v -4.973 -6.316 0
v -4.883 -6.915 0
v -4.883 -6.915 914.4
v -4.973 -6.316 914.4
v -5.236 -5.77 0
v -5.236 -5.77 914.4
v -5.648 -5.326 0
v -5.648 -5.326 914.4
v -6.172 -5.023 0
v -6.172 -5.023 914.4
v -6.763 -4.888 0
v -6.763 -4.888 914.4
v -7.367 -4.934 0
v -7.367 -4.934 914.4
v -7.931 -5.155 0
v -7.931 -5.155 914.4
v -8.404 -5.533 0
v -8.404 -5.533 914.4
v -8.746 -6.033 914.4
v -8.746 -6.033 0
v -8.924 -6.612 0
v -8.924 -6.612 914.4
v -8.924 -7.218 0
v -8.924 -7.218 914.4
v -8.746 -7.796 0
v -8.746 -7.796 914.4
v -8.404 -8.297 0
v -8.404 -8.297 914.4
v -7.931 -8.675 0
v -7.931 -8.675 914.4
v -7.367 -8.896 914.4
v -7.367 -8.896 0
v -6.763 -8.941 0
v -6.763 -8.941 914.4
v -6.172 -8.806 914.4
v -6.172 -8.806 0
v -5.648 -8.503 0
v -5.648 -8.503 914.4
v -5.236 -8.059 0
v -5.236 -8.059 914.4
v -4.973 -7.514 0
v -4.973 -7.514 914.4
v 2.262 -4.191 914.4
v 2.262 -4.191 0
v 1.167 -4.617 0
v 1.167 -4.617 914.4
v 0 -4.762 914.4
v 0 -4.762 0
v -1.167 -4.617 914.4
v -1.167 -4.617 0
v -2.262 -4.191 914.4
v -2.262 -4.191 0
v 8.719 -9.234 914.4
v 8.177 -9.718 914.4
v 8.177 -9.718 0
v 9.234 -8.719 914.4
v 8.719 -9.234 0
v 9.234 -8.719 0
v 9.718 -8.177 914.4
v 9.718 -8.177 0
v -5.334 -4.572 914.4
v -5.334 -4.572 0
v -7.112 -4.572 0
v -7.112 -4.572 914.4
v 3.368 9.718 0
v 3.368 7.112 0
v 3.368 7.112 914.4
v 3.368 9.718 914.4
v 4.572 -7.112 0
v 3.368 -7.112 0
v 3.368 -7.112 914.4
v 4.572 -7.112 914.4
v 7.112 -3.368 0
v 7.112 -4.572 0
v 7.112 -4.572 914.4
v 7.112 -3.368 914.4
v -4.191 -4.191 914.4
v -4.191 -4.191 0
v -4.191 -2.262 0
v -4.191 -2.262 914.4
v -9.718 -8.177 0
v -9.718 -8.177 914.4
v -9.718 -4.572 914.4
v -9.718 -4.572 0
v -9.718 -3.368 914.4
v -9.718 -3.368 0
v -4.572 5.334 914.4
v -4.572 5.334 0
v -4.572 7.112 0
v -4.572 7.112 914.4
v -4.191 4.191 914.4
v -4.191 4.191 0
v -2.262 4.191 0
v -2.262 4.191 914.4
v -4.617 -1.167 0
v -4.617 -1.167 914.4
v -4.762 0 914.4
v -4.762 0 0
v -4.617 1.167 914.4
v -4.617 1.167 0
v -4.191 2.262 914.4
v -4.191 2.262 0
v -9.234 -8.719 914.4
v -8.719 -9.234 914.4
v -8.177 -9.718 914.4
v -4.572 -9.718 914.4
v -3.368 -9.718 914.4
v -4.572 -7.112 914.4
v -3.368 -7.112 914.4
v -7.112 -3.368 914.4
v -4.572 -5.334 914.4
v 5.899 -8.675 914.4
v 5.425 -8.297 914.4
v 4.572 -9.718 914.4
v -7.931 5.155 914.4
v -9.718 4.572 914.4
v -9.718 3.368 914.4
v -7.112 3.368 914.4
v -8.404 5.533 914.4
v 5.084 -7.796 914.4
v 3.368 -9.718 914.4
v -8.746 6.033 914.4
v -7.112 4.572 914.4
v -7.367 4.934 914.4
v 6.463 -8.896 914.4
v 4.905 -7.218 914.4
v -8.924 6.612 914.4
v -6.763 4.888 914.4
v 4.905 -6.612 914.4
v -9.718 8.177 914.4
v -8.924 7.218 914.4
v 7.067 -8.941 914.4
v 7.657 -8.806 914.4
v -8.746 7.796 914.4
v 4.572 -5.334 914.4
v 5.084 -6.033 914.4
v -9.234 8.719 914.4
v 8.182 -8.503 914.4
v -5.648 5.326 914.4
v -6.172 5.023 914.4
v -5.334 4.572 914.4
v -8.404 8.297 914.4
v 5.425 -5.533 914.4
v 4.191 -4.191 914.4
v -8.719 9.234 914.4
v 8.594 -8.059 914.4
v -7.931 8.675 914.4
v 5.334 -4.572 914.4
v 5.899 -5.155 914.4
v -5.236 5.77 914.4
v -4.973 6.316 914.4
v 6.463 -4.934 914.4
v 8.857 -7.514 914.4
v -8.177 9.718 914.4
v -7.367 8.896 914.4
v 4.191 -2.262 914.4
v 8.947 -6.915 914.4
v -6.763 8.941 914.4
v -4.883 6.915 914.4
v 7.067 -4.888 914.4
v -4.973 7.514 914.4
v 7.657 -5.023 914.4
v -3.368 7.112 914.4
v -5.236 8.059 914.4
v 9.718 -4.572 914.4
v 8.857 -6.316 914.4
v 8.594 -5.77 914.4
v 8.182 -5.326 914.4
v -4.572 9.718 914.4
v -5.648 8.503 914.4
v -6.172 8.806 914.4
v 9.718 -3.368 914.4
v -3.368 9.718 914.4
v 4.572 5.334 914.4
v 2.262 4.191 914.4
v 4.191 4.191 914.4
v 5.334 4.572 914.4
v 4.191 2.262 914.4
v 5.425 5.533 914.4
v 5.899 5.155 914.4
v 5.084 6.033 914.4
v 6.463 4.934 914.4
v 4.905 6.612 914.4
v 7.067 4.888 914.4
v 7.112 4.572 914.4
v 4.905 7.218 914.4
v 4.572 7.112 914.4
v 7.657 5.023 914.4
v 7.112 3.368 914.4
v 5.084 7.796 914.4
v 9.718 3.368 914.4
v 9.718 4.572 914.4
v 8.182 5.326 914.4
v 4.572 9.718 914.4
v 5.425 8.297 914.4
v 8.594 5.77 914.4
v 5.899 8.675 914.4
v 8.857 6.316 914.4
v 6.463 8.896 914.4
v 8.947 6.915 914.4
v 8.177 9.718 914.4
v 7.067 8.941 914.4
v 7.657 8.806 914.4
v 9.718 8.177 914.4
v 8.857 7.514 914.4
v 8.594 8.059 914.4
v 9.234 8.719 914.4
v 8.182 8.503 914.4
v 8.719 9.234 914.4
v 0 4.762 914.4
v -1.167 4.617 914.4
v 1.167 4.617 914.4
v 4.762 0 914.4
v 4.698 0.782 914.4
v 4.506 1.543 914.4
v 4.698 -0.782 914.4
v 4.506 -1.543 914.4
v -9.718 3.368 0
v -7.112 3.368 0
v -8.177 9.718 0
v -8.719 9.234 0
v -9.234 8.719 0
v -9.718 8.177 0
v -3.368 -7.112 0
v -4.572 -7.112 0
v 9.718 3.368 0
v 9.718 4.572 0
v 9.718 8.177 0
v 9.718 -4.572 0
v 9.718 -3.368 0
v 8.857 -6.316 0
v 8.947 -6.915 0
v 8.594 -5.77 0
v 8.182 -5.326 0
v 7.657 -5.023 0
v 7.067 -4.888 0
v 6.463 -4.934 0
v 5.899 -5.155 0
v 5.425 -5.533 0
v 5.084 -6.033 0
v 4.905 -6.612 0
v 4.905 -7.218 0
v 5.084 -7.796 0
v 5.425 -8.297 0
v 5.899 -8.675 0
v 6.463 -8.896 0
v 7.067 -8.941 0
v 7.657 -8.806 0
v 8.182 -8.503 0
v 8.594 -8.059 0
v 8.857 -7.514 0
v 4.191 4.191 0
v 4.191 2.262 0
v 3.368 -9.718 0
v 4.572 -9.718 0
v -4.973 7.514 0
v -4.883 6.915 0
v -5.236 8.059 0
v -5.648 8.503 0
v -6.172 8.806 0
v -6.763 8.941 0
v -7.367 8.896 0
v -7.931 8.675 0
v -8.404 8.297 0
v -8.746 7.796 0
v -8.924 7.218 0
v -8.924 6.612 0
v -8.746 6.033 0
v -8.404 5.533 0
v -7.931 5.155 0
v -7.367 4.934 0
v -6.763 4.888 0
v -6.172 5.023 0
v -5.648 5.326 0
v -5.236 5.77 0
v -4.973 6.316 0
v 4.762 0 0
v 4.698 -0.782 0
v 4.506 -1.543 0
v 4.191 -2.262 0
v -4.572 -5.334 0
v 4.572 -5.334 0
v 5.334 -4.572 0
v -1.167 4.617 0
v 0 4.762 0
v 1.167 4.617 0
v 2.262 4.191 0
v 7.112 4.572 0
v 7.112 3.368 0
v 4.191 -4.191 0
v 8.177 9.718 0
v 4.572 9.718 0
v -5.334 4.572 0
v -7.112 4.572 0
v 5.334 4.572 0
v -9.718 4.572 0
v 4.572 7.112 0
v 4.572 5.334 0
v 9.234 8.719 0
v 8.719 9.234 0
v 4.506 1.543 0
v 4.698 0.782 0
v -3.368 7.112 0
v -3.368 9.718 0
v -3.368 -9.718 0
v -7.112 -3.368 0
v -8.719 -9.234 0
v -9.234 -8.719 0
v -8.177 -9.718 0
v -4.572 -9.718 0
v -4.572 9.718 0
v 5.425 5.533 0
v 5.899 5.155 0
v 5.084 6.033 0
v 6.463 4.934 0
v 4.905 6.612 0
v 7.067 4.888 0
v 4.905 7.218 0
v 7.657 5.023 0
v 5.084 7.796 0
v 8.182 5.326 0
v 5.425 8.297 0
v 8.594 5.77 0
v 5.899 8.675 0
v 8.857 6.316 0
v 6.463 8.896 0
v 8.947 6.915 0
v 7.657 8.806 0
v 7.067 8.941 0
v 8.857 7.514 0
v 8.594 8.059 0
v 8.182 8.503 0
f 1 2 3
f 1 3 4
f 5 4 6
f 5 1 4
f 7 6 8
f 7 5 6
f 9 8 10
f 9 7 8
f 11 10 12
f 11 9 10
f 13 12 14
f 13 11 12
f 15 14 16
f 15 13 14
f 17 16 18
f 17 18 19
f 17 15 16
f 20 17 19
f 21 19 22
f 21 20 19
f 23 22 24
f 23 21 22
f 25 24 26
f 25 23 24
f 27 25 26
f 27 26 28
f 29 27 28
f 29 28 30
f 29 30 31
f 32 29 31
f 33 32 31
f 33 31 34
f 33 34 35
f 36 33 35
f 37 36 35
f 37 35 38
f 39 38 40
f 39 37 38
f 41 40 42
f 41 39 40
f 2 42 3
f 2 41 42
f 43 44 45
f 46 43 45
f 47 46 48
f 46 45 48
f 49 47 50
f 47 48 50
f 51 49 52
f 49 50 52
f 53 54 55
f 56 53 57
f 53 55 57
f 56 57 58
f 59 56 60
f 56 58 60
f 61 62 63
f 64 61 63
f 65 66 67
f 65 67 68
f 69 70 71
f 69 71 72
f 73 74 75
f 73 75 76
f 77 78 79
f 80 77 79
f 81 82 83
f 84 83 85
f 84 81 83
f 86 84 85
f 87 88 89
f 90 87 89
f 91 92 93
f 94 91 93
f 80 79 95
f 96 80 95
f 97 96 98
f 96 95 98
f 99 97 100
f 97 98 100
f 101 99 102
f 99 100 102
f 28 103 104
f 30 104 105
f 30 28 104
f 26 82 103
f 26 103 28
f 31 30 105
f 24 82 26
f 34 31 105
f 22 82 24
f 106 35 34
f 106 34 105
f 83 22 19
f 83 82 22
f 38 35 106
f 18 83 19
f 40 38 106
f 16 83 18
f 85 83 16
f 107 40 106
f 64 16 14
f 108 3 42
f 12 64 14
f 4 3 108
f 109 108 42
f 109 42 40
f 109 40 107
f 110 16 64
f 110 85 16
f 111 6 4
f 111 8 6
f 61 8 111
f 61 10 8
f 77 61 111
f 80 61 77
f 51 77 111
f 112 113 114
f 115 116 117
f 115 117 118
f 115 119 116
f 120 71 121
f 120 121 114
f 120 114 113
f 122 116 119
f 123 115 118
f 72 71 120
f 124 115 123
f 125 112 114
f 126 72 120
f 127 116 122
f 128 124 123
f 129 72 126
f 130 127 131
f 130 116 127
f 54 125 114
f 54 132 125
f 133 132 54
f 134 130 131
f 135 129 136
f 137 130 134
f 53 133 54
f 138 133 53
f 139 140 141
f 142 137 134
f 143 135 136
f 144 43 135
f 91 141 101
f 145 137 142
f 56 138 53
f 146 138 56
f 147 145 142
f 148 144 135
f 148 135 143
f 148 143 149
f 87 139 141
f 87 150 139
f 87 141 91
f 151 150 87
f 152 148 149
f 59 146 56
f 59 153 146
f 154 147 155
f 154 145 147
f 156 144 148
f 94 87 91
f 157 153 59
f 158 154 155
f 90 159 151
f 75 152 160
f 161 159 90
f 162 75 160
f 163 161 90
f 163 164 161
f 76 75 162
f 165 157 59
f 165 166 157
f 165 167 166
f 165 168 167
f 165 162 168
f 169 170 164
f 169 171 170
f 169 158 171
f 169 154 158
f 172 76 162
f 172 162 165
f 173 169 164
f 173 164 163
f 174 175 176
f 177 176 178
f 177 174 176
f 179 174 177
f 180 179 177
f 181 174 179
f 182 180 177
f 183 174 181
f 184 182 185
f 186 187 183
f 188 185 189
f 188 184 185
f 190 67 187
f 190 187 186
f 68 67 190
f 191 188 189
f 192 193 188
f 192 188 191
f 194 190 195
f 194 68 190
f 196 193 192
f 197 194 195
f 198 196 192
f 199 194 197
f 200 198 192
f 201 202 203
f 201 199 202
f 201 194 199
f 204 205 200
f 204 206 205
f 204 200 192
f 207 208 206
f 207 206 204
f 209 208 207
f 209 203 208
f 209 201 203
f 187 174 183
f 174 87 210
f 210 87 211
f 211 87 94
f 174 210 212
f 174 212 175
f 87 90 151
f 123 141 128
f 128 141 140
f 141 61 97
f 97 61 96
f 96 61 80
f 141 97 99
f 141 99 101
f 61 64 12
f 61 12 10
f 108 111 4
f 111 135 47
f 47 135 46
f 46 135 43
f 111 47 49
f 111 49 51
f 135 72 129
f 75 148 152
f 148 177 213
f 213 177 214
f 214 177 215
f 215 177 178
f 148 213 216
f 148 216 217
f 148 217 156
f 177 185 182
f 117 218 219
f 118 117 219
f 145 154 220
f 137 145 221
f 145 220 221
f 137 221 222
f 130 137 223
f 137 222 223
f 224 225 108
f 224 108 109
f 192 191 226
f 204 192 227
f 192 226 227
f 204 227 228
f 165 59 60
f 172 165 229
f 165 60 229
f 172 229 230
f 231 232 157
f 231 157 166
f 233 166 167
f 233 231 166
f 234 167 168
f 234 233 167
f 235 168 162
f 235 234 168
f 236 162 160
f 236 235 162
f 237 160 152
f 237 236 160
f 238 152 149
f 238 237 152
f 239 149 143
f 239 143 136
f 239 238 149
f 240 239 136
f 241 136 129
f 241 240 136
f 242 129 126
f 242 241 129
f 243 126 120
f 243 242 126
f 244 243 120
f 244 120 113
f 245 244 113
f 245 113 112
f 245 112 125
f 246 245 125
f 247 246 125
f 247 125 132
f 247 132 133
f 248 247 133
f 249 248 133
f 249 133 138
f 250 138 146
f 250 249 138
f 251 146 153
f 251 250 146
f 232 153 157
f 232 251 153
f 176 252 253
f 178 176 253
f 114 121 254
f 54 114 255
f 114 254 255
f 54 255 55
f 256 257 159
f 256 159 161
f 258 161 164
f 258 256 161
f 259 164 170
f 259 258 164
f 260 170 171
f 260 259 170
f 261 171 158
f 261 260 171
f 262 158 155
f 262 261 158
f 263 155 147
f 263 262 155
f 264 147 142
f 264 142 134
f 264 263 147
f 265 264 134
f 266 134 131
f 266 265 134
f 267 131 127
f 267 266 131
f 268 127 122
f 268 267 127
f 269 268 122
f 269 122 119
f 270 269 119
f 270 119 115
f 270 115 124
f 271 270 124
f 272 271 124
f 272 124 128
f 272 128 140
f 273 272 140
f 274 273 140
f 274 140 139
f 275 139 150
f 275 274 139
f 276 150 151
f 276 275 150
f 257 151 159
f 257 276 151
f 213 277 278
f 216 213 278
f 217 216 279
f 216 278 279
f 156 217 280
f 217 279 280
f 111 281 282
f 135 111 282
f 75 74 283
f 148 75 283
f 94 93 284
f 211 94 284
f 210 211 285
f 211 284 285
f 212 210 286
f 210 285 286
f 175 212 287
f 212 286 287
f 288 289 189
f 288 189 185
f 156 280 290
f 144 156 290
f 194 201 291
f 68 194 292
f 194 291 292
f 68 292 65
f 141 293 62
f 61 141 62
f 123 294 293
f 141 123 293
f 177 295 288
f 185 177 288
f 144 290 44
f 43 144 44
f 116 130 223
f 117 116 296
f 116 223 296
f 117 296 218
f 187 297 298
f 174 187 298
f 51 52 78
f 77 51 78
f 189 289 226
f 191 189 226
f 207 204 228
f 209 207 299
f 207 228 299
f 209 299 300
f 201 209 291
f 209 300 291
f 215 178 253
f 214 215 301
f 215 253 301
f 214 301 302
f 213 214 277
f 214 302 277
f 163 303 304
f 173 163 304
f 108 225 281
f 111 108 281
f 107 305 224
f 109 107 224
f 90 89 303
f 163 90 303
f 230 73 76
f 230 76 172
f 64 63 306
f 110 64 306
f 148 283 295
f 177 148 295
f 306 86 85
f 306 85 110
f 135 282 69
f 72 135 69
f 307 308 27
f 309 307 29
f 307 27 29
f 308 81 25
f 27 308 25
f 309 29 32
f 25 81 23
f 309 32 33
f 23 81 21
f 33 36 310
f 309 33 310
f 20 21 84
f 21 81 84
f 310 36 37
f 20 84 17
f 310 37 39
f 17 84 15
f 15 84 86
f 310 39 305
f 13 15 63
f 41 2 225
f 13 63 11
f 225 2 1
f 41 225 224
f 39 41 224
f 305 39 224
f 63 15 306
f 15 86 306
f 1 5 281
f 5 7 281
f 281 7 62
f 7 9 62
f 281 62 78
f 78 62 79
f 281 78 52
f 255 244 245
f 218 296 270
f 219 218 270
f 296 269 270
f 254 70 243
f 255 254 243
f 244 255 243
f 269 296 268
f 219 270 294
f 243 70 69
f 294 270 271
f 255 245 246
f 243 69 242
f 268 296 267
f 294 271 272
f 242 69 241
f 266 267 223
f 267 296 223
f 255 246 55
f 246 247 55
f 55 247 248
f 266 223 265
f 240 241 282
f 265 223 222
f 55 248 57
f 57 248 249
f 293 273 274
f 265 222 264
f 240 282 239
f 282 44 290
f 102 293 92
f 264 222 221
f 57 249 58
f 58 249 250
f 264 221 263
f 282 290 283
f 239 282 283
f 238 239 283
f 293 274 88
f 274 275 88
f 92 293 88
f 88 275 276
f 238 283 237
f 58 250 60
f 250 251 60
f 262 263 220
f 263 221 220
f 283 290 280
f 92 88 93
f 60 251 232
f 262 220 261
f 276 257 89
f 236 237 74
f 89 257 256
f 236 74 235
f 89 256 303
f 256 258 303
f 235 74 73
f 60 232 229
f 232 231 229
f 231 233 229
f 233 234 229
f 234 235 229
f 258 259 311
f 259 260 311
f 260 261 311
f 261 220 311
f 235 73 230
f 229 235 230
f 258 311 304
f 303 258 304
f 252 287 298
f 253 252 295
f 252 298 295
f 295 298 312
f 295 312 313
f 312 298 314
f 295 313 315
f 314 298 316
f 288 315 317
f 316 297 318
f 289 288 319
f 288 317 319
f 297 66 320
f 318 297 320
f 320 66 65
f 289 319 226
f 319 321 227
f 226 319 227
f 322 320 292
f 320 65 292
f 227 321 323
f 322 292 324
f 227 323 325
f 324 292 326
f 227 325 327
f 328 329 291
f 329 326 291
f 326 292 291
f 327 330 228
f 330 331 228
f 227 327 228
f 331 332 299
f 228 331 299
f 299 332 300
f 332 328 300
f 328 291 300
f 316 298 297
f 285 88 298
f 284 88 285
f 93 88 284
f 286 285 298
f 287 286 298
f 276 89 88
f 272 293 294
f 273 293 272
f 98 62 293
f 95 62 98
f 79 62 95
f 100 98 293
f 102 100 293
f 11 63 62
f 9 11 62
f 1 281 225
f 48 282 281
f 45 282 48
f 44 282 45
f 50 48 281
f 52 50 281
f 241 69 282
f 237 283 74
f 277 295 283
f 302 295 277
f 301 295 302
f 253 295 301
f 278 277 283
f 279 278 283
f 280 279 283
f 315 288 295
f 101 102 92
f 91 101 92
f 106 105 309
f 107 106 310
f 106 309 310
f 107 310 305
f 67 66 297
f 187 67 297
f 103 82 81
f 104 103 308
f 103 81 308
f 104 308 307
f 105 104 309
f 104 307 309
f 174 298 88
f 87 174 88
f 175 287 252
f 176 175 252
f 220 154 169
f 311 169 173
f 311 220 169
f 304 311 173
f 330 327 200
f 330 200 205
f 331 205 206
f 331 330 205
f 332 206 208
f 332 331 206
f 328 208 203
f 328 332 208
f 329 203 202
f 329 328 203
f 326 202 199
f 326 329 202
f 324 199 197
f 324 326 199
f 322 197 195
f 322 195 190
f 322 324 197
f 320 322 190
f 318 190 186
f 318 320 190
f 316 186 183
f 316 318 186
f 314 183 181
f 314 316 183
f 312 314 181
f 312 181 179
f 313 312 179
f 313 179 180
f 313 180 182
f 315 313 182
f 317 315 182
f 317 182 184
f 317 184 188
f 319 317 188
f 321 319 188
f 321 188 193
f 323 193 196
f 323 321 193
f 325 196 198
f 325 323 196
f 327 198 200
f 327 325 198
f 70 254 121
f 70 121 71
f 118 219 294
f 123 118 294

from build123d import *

# Parameters (mm, degrees)
SKETCH3_R           = 2.032
SKETCH3_W           = 0.76159928
SKETCH3_H           = 0.76159928
SKETCH3_W_2         = 1.204804675
SKETCH3_H_2         = 2.605195325
SKETCH3_W_3         = 2.605195325
SKETCH3_H_3         = 1.204804675
BOSS_EXTRUDE3_DEPTH = 914.4


with BuildPart() as part:
    # Sketch3 → Boss-Extrude3 (new body)
    with BuildSketch(Plane.XY):
        with BuildLine():
            ThreePointArc((9.717596045, 8.176694142), (8.980256121, 8.980256121), (8.176694142, 9.717596045))
            Line((8.176694142, 9.717596045), (4.57240072, 9.717596045))
            Line((4.57240072, 9.717596045), (4.57240072, 7.11240072))
            Line((4.57240072, 7.11240072), (4.57240072, 5.334))
            Line((4.57240072, 5.334), (5.334, 5.334))
            Line((5.334, 5.334), (5.334, 4.57240072))
            Line((5.334, 4.57240072), (7.11240072, 4.57240072))
            Line((7.11240072, 4.57240072), (9.717596045, 4.57240072))
            Line((9.717596045, 4.57240072), (9.717596045, 8.176694142))
        make_face()
        with Locations((6.914797213, 6.914797213)):
            Circle(SKETCH3_R, mode=Mode.SUBTRACT)
        with Locations((4.95320036, 4.95320036)):
            Rectangle(SKETCH3_W, SKETCH3_H)
        Polygon((4.57240072, 5.334), (3.367596045, 5.334), (3.367596045, 4.191), (4.191, 4.191), (4.191, 3.367596045), (5.334, 3.367596045), (5.334, 4.57240072), (4.57240072, 4.57240072), align=None)
        with BuildLine():
            Line((3.367596045, 5.334), (-3.367596045, 5.334))
            Line((-3.367596045, 5.334), (-3.367596045, 4.191))
            Line((-3.367596045, 4.191), (-2.262062168, 4.191))
            ThreePointArc((-2.262062168, 4.191), (0, 4.7625), (2.262062168, 4.191))
            Line((2.262062168, 4.191), (3.367596045, 4.191))
            Line((3.367596045, 4.191), (3.367596045, 5.334))
        make_face()
        with BuildLine():
            Line((5.334, 3.367596045), (4.191, 3.367596045))
            Line((4.191, 3.367596045), (4.191, 2.262062168))
            ThreePointArc((4.191, 2.262062168), (4.617415064, 1.16656949), (4.7625, 0))
            ThreePointArc((4.7625, 0), (4.617415064, -1.16656949), (4.191, -2.262062168))
            Line((4.191, -2.262062168), (4.191, -3.367596045))
            Line((4.191, -3.367596045), (5.334, -3.367596045))
            Line((5.334, -3.367596045), (5.334, 3.367596045))
        make_face()
        with Locations((3.969998383, 8.414998383)):
            Rectangle(SKETCH3_W_2, SKETCH3_H_2)
        with Locations((8.414998383, 3.969998383)):
            Rectangle(SKETCH3_W_3, SKETCH3_H_3)
        with BuildLine():
            Line((4.57240072, -9.717596045), (8.176694142, -9.717596045))
            ThreePointArc((8.176694142, -9.717596045), (8.980256121, -8.980256121), (9.717596045, -8.176694142))
            Line((9.717596045, -8.176694142), (9.717596045, -4.57240072))
            Line((9.717596045, -4.57240072), (7.11240072, -4.57240072))
            Line((7.11240072, -4.57240072), (5.334, -4.57240072))
            Line((5.334, -4.57240072), (5.334, -5.334))
            Line((5.334, -5.334), (4.57240072, -5.334))
            Line((4.57240072, -5.334), (4.57240072, -7.11240072))
            Line((4.57240072, -7.11240072), (4.57240072, -9.717596045))
        make_face()
        with Locations((6.914797213, -6.914797213)):
            Circle(SKETCH3_R, mode=Mode.SUBTRACT)
        with Locations((4.95320036, -4.95320036)):
            Rectangle(SKETCH3_W, SKETCH3_H)
        with Locations((8.414998383, -3.969998383)):
            Rectangle(SKETCH3_W_3, SKETCH3_H_3)
        with Locations((3.969998383, -8.414998383)):
            Rectangle(SKETCH3_W_2, SKETCH3_H_2)
        Polygon((3.367596045, -4.191), (3.367596045, -5.334), (4.57240072, -5.334), (4.57240072, -4.57240072), (5.334, -4.57240072), (5.334, -3.367596045), (4.191, -3.367596045), (4.191, -4.191), align=None)
        with BuildLine():
            Line((-2.262062168, -4.191), (-3.367596045, -4.191))
            Line((-3.367596045, -4.191), (-3.367596045, -5.334))
            Line((-3.367596045, -5.334), (3.367596045, -5.334))
            Line((3.367596045, -5.334), (3.367596045, -4.191))
            Line((3.367596045, -4.191), (2.262062168, -4.191))
            ThreePointArc((2.262062168, -4.191), (0, -4.7625), (-2.262062168, -4.191))
        make_face()
        with Locations((-4.95320036, -4.95320036)):
            Rectangle(SKETCH3_W, SKETCH3_H)
        Polygon((-4.191, -3.367596045), (-5.334, -3.367596045), (-5.334, -4.57240072), (-4.57240072, -4.57240072), (-4.57240072, -5.334), (-3.367596045, -5.334), (-3.367596045, -4.191), (-4.191, -4.191), align=None)
        with BuildLine():
            Line((-5.334, -4.57240072), (-7.11240072, -4.57240072))
            Line((-7.11240072, -4.57240072), (-9.717596045, -4.57240072))
            Line((-9.717596045, -4.57240072), (-9.717596045, -8.176694142))
            ThreePointArc((-9.717596045, -8.176694142), (-8.980256121, -8.980256121), (-8.176694142, -9.717596045))
            Line((-8.176694142, -9.717596045), (-4.57240072, -9.717596045))
            Line((-4.57240072, -9.717596045), (-4.57240072, -7.11240072))
            Line((-4.57240072, -7.11240072), (-4.57240072, -5.334))
            Line((-4.57240072, -5.334), (-5.334, -5.334))
            Line((-5.334, -5.334), (-5.334, -4.57240072))
        make_face()
        with Locations((-6.914797213, -6.914797213)):
            Circle(SKETCH3_R, mode=Mode.SUBTRACT)
        with Locations((-3.969998383, -8.414998383)):
            Rectangle(SKETCH3_W_2, SKETCH3_H_2)
        with Locations((-8.414998383, -3.969998383)):
            Rectangle(SKETCH3_W_3, SKETCH3_H_3)
        with BuildLine():
            Line((-4.191, 3.367596045), (-5.334, 3.367596045))
            Line((-5.334, 3.367596045), (-5.334, -3.367596045))
            Line((-5.334, -3.367596045), (-4.191, -3.367596045))
            Line((-4.191, -3.367596045), (-4.191, -2.262062168))
            ThreePointArc((-4.191, -2.262062168), (-4.7625, 0), (-4.191, 2.262062168))
            Line((-4.191, 2.262062168), (-4.191, 3.367596045))
        make_face()
        with Locations((-4.95320036, 4.95320036)):
            Rectangle(SKETCH3_W, SKETCH3_H)
        Polygon((-4.57240072, 4.57240072), (-5.334, 4.57240072), (-5.334, 3.367596045), (-4.191, 3.367596045), (-4.191, 4.191), (-3.367596045, 4.191), (-3.367596045, 5.334), (-4.57240072, 5.334), align=None)
        with BuildLine():
            Line((-9.717596045, 4.57240072), (-7.11240072, 4.57240072))
            Line((-7.11240072, 4.57240072), (-5.334, 4.57240072))
            Line((-5.334, 4.57240072), (-5.334, 5.334))
            Line((-5.334, 5.334), (-4.57240072, 5.334))
            Line((-4.57240072, 5.334), (-4.57240072, 7.11240072))
            Line((-4.57240072, 7.11240072), (-4.57240072, 9.717596045))
            Line((-4.57240072, 9.717596045), (-8.176694142, 9.717596045))
            ThreePointArc((-8.176694142, 9.717596045), (-8.980256121, 8.980256121), (-9.717596045, 8.176694142))
            Line((-9.717596045, 8.176694142), (-9.717596045, 4.57240072))
        make_face()
        with Locations((-6.914797213, 6.914797213)):
            Circle(SKETCH3_R, mode=Mode.SUBTRACT)
        with Locations((-3.969998383, 8.414998383)):
            Rectangle(SKETCH3_W_2, SKETCH3_H_2)
        with Locations((-8.414998383, 3.969998383)):
            Rectangle(SKETCH3_W_3, SKETCH3_H_3)
    extrude(amount=BOSS_EXTRUDE3_DEPTH)


solid = part.part
